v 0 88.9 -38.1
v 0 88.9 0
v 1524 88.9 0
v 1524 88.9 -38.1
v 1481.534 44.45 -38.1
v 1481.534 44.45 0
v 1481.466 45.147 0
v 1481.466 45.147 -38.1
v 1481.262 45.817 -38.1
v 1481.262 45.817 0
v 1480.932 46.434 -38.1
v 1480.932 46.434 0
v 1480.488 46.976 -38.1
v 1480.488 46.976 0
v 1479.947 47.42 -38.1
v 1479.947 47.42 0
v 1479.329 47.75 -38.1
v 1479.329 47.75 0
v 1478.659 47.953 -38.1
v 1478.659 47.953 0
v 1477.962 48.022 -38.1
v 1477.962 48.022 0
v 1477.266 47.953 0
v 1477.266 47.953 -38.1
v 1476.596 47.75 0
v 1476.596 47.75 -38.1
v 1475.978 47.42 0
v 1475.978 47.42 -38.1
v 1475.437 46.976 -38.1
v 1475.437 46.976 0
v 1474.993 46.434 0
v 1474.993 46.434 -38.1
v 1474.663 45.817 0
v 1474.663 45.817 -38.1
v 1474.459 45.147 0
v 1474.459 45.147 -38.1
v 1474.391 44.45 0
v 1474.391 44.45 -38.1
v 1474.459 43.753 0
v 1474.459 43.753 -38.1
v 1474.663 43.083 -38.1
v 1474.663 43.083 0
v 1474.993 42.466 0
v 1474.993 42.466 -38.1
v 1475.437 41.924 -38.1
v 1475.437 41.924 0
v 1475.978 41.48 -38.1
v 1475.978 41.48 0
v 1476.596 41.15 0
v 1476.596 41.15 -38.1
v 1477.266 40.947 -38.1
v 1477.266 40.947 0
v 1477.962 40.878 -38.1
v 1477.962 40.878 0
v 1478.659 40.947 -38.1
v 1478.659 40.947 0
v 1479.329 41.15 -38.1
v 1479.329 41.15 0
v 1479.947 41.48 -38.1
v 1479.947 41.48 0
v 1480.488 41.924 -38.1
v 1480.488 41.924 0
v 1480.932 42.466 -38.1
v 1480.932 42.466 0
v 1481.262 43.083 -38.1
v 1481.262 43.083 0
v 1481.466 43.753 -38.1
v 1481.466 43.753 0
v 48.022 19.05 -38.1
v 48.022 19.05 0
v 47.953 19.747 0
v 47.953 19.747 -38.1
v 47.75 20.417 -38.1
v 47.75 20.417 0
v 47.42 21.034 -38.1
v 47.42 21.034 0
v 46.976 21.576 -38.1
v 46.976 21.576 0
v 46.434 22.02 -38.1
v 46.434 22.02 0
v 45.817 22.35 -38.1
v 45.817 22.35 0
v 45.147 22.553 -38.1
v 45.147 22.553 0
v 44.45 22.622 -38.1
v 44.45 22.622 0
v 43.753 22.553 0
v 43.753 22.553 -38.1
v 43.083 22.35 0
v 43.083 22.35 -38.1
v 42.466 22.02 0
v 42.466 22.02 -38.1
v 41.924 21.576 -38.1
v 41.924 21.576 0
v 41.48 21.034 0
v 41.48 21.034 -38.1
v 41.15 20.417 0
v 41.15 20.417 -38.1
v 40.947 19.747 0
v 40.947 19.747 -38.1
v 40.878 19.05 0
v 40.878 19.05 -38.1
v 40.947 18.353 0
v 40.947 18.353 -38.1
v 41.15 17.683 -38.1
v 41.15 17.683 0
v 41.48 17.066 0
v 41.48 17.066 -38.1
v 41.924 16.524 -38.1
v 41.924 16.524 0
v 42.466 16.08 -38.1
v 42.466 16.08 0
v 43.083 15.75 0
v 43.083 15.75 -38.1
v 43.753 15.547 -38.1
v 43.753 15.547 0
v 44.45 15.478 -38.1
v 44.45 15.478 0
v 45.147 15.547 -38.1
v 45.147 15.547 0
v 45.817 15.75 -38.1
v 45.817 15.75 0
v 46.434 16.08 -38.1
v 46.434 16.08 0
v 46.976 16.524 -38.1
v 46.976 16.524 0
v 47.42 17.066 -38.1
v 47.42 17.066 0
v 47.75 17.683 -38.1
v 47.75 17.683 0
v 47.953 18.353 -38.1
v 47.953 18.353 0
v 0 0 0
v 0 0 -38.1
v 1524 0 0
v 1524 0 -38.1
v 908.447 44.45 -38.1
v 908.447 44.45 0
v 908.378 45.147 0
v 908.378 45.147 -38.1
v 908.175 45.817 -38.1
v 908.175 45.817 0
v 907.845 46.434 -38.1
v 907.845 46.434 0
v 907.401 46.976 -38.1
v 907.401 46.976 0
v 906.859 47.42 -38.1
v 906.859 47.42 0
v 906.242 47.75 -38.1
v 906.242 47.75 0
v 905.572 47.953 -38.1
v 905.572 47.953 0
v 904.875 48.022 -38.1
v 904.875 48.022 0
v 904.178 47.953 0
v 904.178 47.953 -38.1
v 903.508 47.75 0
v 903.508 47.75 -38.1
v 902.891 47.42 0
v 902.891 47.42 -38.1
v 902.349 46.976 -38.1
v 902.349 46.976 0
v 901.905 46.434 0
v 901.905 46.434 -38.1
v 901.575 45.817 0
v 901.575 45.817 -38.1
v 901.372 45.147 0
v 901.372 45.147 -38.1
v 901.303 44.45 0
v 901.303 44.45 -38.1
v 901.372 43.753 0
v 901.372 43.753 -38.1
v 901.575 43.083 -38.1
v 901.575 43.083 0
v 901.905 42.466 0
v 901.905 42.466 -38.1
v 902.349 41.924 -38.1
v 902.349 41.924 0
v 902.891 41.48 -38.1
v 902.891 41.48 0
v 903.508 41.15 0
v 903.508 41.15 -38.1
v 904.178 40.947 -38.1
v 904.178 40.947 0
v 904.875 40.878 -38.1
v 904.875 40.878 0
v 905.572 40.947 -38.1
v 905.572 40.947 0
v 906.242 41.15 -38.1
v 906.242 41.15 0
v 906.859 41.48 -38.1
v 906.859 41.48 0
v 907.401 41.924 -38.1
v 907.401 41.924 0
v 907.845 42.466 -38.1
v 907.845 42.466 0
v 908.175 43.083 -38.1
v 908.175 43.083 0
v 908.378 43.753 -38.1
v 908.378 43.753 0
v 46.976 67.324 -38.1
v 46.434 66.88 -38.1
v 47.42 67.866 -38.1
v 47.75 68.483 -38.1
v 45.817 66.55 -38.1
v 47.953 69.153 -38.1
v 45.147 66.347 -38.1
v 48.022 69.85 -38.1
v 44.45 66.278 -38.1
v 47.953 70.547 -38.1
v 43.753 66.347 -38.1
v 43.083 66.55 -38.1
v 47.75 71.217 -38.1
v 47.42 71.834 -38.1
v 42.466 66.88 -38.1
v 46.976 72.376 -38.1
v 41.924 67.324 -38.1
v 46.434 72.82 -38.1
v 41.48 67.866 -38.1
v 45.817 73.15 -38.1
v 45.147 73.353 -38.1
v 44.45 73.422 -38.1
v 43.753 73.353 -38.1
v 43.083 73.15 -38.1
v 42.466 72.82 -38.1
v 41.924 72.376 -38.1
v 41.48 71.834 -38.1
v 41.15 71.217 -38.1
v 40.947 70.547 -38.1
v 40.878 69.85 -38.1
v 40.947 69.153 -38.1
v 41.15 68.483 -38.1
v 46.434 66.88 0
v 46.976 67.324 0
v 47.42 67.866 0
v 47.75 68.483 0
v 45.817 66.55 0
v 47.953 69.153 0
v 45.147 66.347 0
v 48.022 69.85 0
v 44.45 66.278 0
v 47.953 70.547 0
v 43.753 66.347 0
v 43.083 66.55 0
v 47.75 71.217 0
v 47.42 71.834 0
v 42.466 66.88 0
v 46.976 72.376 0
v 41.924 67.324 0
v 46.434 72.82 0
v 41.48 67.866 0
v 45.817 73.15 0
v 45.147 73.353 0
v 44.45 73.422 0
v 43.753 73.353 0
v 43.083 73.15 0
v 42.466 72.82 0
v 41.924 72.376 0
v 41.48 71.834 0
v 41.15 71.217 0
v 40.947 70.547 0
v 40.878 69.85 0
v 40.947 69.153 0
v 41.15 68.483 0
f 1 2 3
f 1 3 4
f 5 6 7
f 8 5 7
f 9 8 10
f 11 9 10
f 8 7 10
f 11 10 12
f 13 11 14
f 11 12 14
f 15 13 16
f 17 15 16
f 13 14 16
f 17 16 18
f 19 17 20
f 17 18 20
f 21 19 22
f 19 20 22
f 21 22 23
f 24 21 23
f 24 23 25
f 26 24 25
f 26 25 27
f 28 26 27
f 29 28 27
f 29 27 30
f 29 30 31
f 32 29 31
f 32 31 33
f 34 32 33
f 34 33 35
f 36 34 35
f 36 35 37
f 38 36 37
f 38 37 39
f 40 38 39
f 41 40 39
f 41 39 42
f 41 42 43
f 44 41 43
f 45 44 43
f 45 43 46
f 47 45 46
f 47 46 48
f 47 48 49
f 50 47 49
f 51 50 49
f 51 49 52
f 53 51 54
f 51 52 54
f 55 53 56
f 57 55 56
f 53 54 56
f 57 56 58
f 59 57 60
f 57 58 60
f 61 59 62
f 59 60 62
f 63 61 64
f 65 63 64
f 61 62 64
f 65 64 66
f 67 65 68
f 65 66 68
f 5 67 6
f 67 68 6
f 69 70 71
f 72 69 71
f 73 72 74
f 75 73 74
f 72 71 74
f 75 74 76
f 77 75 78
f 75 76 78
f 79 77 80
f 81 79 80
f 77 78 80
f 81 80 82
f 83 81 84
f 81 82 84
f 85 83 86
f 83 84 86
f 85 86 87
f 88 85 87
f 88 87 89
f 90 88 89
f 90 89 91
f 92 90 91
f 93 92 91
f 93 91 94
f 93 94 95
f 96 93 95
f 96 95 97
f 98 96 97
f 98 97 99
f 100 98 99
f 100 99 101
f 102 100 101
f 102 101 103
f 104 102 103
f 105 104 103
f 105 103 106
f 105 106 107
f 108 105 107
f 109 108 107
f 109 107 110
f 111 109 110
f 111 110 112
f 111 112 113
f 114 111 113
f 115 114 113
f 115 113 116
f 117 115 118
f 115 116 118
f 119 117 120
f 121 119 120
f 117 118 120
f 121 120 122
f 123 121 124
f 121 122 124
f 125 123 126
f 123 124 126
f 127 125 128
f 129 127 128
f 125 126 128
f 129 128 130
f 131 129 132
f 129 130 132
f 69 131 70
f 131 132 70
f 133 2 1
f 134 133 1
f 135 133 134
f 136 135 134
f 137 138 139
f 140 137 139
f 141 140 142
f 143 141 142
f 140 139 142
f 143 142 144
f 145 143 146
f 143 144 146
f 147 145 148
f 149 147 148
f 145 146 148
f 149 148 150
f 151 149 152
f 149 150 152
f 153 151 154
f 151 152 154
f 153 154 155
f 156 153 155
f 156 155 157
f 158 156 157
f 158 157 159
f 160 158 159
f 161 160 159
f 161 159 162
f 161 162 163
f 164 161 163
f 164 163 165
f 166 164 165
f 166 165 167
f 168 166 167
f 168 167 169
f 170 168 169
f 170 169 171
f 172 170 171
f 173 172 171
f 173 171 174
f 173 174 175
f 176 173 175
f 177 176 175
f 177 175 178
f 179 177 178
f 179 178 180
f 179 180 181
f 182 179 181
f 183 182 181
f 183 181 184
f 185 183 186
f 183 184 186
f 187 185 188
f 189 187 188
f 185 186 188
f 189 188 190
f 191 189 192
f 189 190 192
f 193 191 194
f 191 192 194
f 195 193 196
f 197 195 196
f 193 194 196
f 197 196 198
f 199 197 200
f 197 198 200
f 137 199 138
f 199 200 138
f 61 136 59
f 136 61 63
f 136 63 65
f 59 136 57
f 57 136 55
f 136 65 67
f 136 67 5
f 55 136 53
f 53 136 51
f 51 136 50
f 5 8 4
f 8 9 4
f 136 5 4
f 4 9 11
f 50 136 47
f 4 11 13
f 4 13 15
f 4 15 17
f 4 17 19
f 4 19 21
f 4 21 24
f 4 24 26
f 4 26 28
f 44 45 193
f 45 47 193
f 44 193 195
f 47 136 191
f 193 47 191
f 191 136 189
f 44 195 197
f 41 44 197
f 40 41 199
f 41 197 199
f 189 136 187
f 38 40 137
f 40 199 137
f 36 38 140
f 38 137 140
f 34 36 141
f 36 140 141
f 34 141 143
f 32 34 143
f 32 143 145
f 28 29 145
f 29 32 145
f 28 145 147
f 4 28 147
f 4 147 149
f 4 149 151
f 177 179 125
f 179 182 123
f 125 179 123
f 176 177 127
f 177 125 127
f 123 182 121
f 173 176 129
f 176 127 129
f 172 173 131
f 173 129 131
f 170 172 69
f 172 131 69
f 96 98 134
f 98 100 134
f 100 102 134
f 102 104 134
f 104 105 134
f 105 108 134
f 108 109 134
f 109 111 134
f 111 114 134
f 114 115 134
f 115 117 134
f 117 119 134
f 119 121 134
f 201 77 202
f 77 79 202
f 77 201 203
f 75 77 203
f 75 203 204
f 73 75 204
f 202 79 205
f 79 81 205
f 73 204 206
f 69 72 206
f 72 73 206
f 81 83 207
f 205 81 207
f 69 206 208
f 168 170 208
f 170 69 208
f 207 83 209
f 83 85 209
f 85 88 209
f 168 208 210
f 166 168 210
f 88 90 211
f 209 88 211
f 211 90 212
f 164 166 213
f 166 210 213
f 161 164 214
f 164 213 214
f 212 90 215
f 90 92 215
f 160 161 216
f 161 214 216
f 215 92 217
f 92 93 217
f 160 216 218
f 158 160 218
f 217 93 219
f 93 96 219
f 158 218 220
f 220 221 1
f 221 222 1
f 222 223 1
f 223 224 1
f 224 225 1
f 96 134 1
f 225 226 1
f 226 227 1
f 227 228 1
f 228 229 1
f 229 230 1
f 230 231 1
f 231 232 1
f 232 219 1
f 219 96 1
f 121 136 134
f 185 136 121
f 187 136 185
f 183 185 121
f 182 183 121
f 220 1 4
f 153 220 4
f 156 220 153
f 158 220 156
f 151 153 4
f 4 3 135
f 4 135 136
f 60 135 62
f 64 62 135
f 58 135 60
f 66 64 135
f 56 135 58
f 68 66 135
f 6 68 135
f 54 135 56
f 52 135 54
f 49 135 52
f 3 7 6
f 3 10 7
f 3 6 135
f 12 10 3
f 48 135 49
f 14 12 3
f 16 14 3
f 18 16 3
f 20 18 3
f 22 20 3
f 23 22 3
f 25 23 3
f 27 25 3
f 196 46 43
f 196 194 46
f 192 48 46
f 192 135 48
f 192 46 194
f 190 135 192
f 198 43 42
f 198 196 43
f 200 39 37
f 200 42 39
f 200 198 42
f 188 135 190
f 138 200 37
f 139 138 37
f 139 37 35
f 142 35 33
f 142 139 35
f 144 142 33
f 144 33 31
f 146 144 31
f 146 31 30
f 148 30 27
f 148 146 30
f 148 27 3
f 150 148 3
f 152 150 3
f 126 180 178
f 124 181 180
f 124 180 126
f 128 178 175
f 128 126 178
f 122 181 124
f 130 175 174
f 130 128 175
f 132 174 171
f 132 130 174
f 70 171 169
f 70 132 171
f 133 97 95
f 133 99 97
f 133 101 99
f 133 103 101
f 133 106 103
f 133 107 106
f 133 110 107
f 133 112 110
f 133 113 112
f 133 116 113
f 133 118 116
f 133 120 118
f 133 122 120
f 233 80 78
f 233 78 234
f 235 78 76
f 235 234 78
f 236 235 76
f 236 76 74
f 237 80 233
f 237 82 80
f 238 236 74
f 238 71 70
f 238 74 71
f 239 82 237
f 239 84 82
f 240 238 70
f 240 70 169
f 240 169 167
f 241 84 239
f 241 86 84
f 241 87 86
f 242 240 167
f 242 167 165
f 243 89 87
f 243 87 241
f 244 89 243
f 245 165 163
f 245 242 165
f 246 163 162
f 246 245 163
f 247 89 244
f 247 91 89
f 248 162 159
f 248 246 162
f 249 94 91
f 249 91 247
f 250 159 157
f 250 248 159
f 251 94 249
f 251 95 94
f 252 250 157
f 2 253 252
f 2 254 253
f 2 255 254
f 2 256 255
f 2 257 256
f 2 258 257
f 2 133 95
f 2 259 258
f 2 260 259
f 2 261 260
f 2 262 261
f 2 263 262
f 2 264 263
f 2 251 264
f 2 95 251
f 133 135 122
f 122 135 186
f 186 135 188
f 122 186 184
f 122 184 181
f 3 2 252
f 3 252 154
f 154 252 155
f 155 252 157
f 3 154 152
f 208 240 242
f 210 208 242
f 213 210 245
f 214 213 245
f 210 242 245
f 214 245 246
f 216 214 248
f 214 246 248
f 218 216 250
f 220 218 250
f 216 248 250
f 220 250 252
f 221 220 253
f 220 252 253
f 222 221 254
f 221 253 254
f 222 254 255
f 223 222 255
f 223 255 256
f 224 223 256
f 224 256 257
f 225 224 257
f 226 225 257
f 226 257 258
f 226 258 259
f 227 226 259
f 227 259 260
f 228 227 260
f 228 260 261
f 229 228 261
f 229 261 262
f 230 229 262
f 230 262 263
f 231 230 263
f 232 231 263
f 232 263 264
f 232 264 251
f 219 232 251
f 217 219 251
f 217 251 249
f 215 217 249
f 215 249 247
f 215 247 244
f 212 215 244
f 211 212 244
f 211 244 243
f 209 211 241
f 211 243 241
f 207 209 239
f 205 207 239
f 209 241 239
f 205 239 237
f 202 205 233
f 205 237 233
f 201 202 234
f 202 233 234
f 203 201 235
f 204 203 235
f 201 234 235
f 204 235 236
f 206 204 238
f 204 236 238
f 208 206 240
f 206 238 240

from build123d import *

# Parameters (mm, degrees)
SKETCH1_W           = 38.1
SKETCH1_H           = 88.9
BOSS_EXTRUDE1_DEPTH = 1524
SKETCH2_R           = 3.571875
CUT_EXTRUDE1_DEPTH  = 1528.066082395


with BuildPart() as part:
    # Sketch1 → Boss-Extrude1 (new body)
    with BuildSketch(Plane(origin=(0, 0, 0), x_dir=(0, 0, -1), z_dir=(1, 0, 0))):
        with Locations((19.05, 44.45)):
            Rectangle(SKETCH1_W, SKETCH1_H)
    extrude(amount=BOSS_EXTRUDE1_DEPTH)

    # Sketch2 → Cut-Extrude1 (cut, through all)
    with BuildSketch(Plane.XY):
        with Locations((44.45, 19.05)):
            Circle(SKETCH2_R)
        with Locations((1477.9625, 44.45)):
            Circle(SKETCH2_R)
        with Locations((44.45, 69.85)):
            Circle(SKETCH2_R)
        with Locations((904.875, 44.45)):
            Circle(SKETCH2_R)
    extrude(amount=-CUT_EXTRUDE1_DEPTH, mode=Mode.SUBTRACT)


solid = part.part
